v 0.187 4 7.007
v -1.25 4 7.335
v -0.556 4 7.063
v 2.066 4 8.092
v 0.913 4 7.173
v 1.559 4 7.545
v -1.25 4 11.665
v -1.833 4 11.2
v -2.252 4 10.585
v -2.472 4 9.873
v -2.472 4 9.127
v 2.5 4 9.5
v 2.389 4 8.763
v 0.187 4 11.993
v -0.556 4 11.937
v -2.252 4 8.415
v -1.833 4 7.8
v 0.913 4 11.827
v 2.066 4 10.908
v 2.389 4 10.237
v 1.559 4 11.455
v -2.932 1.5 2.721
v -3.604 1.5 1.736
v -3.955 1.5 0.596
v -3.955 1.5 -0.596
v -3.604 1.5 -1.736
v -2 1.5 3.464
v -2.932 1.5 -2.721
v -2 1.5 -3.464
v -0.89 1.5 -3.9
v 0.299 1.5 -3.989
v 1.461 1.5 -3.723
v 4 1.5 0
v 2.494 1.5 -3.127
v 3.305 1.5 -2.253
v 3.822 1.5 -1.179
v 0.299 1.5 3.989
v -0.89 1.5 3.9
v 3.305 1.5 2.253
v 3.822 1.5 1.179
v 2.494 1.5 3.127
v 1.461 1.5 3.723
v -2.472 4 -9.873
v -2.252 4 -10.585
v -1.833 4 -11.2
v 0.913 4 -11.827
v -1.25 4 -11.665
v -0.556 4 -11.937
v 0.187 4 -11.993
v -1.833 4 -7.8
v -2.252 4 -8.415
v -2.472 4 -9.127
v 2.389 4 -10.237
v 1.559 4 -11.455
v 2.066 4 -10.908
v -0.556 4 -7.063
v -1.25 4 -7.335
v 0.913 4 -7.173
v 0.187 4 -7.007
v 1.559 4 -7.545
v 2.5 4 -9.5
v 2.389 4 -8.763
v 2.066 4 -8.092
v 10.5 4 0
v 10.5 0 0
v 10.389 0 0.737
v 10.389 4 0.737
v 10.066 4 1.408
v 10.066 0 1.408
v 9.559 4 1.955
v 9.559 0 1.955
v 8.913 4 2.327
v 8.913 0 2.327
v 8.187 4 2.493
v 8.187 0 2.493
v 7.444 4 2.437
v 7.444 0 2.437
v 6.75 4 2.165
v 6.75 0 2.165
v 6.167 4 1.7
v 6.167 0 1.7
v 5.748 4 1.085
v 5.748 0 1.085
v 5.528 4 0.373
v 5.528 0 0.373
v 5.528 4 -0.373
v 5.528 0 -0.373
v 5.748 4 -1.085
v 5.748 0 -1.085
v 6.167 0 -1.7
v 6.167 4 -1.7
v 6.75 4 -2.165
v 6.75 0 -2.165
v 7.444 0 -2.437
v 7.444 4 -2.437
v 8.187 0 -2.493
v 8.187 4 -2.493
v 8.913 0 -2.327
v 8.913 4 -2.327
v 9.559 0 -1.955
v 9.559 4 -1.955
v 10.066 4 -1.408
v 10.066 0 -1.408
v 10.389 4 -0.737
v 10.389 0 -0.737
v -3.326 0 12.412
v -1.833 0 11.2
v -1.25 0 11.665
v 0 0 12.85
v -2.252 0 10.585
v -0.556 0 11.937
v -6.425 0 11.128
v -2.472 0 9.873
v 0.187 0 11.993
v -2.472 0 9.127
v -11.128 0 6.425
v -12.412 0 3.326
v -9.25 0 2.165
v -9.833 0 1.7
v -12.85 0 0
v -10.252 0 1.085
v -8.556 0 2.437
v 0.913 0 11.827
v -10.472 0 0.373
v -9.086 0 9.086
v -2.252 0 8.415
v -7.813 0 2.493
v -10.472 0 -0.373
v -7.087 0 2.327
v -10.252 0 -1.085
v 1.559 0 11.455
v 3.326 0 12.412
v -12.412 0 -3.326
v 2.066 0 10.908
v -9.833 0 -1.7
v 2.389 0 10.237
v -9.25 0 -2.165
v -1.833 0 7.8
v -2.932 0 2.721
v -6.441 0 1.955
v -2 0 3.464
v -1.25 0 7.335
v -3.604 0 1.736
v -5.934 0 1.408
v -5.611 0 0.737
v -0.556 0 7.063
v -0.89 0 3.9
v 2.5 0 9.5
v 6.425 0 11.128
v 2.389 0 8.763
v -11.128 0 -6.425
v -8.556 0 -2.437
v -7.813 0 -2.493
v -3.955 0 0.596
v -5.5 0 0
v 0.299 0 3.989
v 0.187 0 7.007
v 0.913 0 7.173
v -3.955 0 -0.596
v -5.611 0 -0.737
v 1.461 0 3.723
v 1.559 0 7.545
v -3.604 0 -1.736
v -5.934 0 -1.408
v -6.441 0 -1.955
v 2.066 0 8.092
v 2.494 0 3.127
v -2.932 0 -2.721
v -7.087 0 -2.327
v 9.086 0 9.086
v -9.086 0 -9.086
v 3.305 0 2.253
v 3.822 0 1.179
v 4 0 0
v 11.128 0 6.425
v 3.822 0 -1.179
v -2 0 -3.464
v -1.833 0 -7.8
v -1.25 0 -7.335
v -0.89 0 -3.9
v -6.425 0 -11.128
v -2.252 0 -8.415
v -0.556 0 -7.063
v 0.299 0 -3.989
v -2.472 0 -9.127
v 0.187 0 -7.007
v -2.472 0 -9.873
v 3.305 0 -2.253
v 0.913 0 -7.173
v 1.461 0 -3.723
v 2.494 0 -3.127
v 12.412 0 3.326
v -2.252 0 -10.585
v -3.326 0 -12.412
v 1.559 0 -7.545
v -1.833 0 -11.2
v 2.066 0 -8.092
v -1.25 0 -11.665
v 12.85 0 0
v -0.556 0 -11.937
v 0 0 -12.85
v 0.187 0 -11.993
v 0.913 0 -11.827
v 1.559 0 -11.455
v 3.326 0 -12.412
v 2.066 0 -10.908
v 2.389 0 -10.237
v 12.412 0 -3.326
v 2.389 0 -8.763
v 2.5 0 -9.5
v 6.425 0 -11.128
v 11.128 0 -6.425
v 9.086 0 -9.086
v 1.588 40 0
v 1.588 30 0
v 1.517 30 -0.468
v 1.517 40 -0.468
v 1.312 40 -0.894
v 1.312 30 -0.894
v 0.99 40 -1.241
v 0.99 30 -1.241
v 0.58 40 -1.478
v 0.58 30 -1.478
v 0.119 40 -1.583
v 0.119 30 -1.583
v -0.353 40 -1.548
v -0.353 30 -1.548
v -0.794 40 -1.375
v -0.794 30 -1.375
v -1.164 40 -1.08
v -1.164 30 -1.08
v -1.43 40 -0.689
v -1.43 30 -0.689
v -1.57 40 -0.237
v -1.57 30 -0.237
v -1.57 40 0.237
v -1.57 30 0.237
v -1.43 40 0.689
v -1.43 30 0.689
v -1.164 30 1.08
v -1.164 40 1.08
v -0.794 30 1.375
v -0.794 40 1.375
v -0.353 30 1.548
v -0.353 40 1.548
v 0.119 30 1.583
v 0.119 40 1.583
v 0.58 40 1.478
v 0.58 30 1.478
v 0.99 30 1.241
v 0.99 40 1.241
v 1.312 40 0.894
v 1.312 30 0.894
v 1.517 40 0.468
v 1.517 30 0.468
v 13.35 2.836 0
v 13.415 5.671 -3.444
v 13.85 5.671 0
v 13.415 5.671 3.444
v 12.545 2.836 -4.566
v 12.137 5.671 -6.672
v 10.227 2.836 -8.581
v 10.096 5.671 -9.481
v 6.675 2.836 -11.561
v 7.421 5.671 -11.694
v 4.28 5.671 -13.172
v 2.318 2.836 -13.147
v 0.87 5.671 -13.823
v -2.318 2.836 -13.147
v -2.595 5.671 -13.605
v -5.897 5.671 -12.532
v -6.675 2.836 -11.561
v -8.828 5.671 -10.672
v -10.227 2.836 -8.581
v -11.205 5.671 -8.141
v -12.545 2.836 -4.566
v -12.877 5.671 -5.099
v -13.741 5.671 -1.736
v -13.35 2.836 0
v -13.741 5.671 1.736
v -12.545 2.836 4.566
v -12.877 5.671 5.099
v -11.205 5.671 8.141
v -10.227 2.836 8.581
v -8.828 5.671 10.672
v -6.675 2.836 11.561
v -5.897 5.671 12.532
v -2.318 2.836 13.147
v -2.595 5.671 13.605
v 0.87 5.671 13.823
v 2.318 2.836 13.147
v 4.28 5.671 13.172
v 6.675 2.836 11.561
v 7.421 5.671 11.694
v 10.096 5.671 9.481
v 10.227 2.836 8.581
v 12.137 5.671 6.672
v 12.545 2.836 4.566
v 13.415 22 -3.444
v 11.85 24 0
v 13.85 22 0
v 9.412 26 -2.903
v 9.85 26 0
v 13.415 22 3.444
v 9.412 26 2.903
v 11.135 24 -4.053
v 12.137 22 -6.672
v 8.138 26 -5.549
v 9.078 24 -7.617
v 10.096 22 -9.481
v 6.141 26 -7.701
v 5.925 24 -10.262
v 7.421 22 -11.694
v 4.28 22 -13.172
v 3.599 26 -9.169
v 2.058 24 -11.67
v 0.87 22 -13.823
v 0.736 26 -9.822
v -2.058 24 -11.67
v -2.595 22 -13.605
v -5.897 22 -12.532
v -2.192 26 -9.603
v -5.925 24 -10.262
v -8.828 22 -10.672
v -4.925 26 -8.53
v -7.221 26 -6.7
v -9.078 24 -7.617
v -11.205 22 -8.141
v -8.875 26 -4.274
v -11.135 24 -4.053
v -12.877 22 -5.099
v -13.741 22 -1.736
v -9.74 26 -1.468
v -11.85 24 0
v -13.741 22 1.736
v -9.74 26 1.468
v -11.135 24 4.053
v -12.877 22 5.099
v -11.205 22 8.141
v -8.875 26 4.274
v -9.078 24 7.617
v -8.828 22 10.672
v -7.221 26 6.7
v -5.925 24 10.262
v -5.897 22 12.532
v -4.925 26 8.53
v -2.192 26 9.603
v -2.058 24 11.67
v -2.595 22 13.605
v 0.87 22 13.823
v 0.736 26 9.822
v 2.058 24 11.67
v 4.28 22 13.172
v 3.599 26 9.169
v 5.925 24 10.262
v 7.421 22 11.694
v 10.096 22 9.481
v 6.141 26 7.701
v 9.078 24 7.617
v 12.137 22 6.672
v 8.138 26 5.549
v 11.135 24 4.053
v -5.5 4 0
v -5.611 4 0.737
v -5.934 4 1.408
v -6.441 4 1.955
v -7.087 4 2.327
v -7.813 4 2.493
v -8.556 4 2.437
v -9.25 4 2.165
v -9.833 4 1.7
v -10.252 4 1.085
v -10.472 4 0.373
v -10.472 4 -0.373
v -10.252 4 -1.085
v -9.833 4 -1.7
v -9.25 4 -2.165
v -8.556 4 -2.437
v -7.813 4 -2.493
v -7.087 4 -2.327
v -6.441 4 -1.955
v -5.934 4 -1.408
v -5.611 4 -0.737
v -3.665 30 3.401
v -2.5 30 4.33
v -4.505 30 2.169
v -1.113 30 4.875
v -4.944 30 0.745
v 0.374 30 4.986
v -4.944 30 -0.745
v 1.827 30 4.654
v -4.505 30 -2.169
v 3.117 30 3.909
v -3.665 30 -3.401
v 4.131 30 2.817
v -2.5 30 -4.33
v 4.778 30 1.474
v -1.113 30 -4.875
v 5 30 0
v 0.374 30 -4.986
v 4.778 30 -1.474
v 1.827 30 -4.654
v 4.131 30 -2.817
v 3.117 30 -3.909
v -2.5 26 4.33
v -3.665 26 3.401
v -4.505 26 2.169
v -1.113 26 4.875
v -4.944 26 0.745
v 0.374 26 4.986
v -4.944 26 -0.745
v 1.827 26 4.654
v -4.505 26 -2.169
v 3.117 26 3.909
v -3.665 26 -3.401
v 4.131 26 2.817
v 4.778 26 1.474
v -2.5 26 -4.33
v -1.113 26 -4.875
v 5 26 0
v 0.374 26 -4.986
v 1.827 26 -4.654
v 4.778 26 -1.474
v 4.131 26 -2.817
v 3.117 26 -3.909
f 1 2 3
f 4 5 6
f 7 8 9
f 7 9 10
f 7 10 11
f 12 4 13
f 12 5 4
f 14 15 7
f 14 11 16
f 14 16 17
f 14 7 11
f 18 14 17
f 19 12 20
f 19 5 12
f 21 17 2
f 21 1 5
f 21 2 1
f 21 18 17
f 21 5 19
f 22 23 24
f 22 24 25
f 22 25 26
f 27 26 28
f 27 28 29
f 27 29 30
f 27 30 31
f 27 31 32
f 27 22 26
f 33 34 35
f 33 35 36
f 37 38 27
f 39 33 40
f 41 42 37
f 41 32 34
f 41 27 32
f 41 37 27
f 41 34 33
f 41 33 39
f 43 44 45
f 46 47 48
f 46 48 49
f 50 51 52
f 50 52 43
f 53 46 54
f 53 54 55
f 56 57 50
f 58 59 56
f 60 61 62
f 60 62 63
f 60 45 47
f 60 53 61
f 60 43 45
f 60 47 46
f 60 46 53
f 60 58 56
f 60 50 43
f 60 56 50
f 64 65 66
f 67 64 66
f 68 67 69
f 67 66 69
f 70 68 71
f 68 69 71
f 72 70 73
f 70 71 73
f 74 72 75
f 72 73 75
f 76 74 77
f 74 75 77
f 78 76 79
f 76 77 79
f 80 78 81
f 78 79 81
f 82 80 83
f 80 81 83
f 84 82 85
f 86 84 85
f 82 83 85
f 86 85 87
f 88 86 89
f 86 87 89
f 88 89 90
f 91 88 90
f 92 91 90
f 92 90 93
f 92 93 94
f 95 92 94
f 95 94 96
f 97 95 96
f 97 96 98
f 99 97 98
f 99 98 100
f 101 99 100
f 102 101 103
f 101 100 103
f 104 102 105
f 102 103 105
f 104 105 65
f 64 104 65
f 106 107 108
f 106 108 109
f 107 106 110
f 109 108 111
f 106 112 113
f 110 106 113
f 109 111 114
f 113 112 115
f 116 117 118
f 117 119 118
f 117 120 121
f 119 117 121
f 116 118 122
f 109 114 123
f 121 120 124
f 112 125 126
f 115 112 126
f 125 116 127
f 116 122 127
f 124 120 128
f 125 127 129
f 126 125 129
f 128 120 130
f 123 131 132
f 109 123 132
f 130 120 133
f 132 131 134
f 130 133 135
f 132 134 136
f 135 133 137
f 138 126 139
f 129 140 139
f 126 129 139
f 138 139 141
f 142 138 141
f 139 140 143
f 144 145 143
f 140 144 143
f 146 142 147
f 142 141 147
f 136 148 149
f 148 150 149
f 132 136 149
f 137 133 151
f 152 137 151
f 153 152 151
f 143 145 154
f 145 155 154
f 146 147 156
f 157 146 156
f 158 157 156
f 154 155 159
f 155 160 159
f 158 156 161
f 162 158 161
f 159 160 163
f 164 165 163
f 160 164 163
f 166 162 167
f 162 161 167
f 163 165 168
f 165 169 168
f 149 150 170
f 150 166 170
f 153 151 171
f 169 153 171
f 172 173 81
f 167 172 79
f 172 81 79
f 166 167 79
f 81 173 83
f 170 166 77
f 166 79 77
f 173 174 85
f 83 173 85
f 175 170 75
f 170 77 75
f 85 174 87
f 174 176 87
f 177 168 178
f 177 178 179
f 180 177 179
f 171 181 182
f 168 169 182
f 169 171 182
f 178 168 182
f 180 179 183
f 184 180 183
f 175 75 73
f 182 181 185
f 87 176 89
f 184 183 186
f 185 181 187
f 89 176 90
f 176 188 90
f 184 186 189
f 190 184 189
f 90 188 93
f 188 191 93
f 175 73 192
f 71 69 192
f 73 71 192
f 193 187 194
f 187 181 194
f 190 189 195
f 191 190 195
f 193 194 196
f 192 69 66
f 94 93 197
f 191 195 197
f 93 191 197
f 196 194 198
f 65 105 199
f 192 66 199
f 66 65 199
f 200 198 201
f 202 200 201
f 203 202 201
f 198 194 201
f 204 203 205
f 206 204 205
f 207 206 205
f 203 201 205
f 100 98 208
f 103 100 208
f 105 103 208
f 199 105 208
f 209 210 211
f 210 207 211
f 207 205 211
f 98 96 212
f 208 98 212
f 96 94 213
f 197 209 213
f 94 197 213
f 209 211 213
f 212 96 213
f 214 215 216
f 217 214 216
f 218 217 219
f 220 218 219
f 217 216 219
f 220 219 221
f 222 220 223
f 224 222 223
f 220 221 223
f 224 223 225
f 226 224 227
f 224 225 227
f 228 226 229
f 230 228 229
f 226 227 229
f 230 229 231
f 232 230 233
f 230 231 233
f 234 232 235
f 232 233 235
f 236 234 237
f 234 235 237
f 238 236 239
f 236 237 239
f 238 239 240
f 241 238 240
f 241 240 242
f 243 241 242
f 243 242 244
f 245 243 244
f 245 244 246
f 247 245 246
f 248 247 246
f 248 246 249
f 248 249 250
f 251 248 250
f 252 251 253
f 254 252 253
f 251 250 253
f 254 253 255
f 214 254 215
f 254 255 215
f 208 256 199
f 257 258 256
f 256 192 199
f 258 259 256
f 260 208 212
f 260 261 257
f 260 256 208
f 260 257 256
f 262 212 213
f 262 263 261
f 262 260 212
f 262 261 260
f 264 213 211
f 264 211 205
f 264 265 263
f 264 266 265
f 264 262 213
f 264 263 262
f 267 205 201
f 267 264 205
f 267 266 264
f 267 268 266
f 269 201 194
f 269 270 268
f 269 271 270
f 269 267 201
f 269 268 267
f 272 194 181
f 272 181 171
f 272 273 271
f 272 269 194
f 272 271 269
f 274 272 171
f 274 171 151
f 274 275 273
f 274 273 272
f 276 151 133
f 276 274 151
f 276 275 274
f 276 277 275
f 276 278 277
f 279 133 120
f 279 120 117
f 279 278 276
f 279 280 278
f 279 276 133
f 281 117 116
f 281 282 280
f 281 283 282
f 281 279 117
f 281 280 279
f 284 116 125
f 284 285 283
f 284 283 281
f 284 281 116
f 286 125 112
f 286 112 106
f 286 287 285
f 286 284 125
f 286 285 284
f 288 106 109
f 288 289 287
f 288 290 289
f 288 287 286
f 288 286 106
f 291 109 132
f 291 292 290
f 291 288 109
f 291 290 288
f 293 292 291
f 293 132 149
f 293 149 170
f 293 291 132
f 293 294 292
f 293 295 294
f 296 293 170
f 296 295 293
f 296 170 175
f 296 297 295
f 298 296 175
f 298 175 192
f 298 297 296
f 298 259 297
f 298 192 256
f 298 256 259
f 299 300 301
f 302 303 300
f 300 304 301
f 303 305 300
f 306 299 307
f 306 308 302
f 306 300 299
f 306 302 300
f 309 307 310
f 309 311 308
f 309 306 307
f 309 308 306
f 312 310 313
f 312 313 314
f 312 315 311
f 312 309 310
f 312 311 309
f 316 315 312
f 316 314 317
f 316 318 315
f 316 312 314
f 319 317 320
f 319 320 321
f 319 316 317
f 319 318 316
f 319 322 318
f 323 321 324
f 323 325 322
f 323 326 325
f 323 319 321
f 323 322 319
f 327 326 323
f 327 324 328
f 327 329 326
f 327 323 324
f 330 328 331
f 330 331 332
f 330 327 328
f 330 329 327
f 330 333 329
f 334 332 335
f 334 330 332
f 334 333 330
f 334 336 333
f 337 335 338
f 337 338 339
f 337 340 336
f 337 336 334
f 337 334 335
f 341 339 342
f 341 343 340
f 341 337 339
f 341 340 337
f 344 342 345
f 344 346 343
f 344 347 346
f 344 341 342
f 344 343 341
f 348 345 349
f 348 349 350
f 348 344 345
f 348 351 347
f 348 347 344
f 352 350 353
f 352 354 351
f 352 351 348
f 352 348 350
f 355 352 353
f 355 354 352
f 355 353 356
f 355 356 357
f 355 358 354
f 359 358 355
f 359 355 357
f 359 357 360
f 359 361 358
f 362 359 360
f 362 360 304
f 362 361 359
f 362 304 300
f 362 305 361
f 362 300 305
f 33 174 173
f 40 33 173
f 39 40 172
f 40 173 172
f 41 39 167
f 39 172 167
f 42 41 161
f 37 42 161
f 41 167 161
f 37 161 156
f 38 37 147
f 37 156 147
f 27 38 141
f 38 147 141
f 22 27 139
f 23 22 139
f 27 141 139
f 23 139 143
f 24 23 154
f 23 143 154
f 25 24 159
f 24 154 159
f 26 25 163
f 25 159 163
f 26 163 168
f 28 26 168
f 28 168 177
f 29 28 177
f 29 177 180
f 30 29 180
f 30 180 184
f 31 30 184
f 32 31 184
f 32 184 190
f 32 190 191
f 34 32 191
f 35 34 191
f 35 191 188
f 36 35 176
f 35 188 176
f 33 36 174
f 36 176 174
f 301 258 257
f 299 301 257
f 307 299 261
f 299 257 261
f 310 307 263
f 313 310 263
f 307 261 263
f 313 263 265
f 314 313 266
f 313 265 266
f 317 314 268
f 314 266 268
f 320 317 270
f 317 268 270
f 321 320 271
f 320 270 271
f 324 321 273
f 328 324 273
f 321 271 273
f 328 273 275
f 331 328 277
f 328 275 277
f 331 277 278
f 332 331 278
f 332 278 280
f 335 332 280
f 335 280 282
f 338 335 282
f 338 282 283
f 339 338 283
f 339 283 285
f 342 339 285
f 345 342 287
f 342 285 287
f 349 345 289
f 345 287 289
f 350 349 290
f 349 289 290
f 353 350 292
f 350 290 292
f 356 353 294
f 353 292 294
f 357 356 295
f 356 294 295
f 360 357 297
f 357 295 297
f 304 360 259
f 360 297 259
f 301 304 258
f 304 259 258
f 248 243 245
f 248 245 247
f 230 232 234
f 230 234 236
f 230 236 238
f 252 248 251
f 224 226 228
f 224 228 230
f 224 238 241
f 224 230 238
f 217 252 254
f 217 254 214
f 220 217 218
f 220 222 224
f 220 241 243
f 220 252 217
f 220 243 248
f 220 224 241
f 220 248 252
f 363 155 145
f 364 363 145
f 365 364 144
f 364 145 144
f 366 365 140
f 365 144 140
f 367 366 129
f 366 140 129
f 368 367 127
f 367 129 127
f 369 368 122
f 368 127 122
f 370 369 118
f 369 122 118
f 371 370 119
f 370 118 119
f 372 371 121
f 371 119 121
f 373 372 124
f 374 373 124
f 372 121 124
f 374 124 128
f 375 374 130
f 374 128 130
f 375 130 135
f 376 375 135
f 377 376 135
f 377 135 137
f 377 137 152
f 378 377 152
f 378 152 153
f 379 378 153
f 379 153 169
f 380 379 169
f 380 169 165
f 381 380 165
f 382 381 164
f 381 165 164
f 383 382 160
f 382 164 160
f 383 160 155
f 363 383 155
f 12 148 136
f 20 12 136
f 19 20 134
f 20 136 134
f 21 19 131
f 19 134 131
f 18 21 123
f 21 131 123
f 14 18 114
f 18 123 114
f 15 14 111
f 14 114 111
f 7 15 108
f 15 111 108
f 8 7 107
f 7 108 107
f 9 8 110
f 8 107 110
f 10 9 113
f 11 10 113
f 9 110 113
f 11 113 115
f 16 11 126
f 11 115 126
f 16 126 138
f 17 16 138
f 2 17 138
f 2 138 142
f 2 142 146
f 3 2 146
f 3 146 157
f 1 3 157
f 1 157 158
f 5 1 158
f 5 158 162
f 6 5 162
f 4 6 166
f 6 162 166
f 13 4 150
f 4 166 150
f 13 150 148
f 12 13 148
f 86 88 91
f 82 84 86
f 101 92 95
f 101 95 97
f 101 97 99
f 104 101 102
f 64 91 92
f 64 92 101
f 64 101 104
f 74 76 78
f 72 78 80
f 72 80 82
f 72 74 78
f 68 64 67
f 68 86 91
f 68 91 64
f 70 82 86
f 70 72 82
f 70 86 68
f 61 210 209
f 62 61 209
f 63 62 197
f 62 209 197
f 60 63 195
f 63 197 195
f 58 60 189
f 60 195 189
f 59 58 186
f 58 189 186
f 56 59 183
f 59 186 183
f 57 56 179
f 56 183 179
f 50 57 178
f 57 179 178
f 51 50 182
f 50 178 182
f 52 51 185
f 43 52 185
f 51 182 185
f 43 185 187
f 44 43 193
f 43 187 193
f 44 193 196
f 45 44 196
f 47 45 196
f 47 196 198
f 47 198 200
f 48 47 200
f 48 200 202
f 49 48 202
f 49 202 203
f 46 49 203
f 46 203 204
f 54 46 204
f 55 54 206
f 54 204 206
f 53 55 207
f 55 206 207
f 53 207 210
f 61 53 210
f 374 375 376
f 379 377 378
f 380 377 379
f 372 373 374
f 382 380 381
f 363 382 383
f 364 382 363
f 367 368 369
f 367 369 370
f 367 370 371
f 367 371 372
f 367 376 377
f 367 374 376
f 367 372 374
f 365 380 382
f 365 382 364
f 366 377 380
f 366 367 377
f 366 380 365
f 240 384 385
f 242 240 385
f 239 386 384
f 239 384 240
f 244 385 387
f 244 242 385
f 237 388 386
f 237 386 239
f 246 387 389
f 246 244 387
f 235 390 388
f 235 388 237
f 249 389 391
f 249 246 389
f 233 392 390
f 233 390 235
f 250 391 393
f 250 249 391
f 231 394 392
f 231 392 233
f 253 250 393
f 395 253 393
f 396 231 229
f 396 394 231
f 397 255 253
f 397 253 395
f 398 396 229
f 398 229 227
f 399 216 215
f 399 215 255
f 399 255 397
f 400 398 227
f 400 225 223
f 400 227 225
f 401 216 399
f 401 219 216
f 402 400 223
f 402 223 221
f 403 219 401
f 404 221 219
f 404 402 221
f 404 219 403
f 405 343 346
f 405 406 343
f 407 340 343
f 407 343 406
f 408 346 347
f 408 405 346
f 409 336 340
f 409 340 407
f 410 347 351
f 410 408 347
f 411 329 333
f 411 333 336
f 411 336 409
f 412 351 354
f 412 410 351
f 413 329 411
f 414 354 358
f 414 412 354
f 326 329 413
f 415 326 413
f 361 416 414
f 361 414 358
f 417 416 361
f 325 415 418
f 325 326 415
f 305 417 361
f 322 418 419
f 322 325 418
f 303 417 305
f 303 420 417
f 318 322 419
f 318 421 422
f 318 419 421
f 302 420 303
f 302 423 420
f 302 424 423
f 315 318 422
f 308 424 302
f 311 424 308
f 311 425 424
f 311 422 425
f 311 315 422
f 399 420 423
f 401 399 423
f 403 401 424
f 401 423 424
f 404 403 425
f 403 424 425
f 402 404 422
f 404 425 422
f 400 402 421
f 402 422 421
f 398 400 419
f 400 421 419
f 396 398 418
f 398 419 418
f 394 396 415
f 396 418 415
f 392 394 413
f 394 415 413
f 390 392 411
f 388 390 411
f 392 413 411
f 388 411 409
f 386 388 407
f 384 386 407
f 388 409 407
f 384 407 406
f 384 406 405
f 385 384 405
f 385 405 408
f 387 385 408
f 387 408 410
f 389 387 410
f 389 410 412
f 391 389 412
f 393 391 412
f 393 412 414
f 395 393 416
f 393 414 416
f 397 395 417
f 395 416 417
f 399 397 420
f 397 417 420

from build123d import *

# Parameters (mm, degrees)
CROQUIS1_R              = 13.85
SALIENTE_EXTRUIR1_DEPTH = 26
CHAFL_N1_SIZE           = 1
CHAFL_N1_SIZE2          = 5.67128182
CHAFL_N2_SIZE           = 4
CROQUIS3_R              = 5
SALIENTE_EXTRUIR3_DEPTH = 4
CROQUIS4_R              = 1.5875
SALIENTE_EXTRUIR4_DEPTH = 10
CROQUIS5_R              = 2.5
CORTAR_EXTRUIR1_DEPTH   = 4
CROQUIS6_R              = 4
CORTAR_EXTRUIR2_DEPTH   = 1.5


with BuildPart() as part:
    # Croquis1 → Saliente-Extruir1 (new body)
    with BuildSketch(Plane(origin=(0, 0, 0), x_dir=(1, 0, 0), z_dir=(0, 1, 0))):
        Circle(CROQUIS1_R)
    extrude(amount=SALIENTE_EXTRUIR1_DEPTH)

    # Chaflán1
    chafl_n1_edges = [part.edges().sort_by_distance(p)[0] for p in [
        (-13.85, 0, 0),
    ]]
    chafl_n1_side = [part.faces().sort_by_distance(p)[0] for p in [
        (0, 0, 0),
    ]]
    chamfer(chafl_n1_edges, length=CHAFL_N1_SIZE, length2=CHAFL_N1_SIZE2, reference=chafl_n1_side[0])

    # Chaflán2
    chafl_n2_edges = [part.edges().sort_by_distance(p)[0] for p in [
        (-13.85, 26, 0),
    ]]
    chamfer(chafl_n2_edges, length=CHAFL_N2_SIZE)

    # Croquis3 → Saliente-Extruir3 (add)
    with BuildSketch(Plane(origin=(0, 26, 0), x_dir=(1, 0, 0), z_dir=(0, 1, 0))):
        Circle(CROQUIS3_R)
    extrude(amount=SALIENTE_EXTRUIR3_DEPTH)

    # Croquis4 → Saliente-Extruir4 (add)
    with BuildSketch(Plane(origin=(0, 30, 0), x_dir=(1, 0, 0), z_dir=(0, 1, 0))):
        Circle(CROQUIS4_R)
    extrude(amount=SALIENTE_EXTRUIR4_DEPTH)

    # Croquis5 → Cortar-Extruir1 (cut)
    with BuildSketch(Plane.XZ):
        with Locations((8, 0)):
            Circle(CROQUIS5_R)
        with Locations((0, 9.5)):
            Circle(CROQUIS5_R)
        with Locations((0, -9.5)):
            Circle(CROQUIS5_R)
        with Locations((-8, 0)):
            Circle(CROQUIS5_R)
    extrude(amount=-CORTAR_EXTRUIR1_DEPTH, mode=Mode.SUBTRACT)

    # Croquis6 → Cortar-Extruir2 (cut)
    with BuildSketch(Plane.XZ):
        Circle(CROQUIS6_R)
    extrude(amount=-CORTAR_EXTRUIR2_DEPTH, mode=Mode.SUBTRACT)


solid = part.part
